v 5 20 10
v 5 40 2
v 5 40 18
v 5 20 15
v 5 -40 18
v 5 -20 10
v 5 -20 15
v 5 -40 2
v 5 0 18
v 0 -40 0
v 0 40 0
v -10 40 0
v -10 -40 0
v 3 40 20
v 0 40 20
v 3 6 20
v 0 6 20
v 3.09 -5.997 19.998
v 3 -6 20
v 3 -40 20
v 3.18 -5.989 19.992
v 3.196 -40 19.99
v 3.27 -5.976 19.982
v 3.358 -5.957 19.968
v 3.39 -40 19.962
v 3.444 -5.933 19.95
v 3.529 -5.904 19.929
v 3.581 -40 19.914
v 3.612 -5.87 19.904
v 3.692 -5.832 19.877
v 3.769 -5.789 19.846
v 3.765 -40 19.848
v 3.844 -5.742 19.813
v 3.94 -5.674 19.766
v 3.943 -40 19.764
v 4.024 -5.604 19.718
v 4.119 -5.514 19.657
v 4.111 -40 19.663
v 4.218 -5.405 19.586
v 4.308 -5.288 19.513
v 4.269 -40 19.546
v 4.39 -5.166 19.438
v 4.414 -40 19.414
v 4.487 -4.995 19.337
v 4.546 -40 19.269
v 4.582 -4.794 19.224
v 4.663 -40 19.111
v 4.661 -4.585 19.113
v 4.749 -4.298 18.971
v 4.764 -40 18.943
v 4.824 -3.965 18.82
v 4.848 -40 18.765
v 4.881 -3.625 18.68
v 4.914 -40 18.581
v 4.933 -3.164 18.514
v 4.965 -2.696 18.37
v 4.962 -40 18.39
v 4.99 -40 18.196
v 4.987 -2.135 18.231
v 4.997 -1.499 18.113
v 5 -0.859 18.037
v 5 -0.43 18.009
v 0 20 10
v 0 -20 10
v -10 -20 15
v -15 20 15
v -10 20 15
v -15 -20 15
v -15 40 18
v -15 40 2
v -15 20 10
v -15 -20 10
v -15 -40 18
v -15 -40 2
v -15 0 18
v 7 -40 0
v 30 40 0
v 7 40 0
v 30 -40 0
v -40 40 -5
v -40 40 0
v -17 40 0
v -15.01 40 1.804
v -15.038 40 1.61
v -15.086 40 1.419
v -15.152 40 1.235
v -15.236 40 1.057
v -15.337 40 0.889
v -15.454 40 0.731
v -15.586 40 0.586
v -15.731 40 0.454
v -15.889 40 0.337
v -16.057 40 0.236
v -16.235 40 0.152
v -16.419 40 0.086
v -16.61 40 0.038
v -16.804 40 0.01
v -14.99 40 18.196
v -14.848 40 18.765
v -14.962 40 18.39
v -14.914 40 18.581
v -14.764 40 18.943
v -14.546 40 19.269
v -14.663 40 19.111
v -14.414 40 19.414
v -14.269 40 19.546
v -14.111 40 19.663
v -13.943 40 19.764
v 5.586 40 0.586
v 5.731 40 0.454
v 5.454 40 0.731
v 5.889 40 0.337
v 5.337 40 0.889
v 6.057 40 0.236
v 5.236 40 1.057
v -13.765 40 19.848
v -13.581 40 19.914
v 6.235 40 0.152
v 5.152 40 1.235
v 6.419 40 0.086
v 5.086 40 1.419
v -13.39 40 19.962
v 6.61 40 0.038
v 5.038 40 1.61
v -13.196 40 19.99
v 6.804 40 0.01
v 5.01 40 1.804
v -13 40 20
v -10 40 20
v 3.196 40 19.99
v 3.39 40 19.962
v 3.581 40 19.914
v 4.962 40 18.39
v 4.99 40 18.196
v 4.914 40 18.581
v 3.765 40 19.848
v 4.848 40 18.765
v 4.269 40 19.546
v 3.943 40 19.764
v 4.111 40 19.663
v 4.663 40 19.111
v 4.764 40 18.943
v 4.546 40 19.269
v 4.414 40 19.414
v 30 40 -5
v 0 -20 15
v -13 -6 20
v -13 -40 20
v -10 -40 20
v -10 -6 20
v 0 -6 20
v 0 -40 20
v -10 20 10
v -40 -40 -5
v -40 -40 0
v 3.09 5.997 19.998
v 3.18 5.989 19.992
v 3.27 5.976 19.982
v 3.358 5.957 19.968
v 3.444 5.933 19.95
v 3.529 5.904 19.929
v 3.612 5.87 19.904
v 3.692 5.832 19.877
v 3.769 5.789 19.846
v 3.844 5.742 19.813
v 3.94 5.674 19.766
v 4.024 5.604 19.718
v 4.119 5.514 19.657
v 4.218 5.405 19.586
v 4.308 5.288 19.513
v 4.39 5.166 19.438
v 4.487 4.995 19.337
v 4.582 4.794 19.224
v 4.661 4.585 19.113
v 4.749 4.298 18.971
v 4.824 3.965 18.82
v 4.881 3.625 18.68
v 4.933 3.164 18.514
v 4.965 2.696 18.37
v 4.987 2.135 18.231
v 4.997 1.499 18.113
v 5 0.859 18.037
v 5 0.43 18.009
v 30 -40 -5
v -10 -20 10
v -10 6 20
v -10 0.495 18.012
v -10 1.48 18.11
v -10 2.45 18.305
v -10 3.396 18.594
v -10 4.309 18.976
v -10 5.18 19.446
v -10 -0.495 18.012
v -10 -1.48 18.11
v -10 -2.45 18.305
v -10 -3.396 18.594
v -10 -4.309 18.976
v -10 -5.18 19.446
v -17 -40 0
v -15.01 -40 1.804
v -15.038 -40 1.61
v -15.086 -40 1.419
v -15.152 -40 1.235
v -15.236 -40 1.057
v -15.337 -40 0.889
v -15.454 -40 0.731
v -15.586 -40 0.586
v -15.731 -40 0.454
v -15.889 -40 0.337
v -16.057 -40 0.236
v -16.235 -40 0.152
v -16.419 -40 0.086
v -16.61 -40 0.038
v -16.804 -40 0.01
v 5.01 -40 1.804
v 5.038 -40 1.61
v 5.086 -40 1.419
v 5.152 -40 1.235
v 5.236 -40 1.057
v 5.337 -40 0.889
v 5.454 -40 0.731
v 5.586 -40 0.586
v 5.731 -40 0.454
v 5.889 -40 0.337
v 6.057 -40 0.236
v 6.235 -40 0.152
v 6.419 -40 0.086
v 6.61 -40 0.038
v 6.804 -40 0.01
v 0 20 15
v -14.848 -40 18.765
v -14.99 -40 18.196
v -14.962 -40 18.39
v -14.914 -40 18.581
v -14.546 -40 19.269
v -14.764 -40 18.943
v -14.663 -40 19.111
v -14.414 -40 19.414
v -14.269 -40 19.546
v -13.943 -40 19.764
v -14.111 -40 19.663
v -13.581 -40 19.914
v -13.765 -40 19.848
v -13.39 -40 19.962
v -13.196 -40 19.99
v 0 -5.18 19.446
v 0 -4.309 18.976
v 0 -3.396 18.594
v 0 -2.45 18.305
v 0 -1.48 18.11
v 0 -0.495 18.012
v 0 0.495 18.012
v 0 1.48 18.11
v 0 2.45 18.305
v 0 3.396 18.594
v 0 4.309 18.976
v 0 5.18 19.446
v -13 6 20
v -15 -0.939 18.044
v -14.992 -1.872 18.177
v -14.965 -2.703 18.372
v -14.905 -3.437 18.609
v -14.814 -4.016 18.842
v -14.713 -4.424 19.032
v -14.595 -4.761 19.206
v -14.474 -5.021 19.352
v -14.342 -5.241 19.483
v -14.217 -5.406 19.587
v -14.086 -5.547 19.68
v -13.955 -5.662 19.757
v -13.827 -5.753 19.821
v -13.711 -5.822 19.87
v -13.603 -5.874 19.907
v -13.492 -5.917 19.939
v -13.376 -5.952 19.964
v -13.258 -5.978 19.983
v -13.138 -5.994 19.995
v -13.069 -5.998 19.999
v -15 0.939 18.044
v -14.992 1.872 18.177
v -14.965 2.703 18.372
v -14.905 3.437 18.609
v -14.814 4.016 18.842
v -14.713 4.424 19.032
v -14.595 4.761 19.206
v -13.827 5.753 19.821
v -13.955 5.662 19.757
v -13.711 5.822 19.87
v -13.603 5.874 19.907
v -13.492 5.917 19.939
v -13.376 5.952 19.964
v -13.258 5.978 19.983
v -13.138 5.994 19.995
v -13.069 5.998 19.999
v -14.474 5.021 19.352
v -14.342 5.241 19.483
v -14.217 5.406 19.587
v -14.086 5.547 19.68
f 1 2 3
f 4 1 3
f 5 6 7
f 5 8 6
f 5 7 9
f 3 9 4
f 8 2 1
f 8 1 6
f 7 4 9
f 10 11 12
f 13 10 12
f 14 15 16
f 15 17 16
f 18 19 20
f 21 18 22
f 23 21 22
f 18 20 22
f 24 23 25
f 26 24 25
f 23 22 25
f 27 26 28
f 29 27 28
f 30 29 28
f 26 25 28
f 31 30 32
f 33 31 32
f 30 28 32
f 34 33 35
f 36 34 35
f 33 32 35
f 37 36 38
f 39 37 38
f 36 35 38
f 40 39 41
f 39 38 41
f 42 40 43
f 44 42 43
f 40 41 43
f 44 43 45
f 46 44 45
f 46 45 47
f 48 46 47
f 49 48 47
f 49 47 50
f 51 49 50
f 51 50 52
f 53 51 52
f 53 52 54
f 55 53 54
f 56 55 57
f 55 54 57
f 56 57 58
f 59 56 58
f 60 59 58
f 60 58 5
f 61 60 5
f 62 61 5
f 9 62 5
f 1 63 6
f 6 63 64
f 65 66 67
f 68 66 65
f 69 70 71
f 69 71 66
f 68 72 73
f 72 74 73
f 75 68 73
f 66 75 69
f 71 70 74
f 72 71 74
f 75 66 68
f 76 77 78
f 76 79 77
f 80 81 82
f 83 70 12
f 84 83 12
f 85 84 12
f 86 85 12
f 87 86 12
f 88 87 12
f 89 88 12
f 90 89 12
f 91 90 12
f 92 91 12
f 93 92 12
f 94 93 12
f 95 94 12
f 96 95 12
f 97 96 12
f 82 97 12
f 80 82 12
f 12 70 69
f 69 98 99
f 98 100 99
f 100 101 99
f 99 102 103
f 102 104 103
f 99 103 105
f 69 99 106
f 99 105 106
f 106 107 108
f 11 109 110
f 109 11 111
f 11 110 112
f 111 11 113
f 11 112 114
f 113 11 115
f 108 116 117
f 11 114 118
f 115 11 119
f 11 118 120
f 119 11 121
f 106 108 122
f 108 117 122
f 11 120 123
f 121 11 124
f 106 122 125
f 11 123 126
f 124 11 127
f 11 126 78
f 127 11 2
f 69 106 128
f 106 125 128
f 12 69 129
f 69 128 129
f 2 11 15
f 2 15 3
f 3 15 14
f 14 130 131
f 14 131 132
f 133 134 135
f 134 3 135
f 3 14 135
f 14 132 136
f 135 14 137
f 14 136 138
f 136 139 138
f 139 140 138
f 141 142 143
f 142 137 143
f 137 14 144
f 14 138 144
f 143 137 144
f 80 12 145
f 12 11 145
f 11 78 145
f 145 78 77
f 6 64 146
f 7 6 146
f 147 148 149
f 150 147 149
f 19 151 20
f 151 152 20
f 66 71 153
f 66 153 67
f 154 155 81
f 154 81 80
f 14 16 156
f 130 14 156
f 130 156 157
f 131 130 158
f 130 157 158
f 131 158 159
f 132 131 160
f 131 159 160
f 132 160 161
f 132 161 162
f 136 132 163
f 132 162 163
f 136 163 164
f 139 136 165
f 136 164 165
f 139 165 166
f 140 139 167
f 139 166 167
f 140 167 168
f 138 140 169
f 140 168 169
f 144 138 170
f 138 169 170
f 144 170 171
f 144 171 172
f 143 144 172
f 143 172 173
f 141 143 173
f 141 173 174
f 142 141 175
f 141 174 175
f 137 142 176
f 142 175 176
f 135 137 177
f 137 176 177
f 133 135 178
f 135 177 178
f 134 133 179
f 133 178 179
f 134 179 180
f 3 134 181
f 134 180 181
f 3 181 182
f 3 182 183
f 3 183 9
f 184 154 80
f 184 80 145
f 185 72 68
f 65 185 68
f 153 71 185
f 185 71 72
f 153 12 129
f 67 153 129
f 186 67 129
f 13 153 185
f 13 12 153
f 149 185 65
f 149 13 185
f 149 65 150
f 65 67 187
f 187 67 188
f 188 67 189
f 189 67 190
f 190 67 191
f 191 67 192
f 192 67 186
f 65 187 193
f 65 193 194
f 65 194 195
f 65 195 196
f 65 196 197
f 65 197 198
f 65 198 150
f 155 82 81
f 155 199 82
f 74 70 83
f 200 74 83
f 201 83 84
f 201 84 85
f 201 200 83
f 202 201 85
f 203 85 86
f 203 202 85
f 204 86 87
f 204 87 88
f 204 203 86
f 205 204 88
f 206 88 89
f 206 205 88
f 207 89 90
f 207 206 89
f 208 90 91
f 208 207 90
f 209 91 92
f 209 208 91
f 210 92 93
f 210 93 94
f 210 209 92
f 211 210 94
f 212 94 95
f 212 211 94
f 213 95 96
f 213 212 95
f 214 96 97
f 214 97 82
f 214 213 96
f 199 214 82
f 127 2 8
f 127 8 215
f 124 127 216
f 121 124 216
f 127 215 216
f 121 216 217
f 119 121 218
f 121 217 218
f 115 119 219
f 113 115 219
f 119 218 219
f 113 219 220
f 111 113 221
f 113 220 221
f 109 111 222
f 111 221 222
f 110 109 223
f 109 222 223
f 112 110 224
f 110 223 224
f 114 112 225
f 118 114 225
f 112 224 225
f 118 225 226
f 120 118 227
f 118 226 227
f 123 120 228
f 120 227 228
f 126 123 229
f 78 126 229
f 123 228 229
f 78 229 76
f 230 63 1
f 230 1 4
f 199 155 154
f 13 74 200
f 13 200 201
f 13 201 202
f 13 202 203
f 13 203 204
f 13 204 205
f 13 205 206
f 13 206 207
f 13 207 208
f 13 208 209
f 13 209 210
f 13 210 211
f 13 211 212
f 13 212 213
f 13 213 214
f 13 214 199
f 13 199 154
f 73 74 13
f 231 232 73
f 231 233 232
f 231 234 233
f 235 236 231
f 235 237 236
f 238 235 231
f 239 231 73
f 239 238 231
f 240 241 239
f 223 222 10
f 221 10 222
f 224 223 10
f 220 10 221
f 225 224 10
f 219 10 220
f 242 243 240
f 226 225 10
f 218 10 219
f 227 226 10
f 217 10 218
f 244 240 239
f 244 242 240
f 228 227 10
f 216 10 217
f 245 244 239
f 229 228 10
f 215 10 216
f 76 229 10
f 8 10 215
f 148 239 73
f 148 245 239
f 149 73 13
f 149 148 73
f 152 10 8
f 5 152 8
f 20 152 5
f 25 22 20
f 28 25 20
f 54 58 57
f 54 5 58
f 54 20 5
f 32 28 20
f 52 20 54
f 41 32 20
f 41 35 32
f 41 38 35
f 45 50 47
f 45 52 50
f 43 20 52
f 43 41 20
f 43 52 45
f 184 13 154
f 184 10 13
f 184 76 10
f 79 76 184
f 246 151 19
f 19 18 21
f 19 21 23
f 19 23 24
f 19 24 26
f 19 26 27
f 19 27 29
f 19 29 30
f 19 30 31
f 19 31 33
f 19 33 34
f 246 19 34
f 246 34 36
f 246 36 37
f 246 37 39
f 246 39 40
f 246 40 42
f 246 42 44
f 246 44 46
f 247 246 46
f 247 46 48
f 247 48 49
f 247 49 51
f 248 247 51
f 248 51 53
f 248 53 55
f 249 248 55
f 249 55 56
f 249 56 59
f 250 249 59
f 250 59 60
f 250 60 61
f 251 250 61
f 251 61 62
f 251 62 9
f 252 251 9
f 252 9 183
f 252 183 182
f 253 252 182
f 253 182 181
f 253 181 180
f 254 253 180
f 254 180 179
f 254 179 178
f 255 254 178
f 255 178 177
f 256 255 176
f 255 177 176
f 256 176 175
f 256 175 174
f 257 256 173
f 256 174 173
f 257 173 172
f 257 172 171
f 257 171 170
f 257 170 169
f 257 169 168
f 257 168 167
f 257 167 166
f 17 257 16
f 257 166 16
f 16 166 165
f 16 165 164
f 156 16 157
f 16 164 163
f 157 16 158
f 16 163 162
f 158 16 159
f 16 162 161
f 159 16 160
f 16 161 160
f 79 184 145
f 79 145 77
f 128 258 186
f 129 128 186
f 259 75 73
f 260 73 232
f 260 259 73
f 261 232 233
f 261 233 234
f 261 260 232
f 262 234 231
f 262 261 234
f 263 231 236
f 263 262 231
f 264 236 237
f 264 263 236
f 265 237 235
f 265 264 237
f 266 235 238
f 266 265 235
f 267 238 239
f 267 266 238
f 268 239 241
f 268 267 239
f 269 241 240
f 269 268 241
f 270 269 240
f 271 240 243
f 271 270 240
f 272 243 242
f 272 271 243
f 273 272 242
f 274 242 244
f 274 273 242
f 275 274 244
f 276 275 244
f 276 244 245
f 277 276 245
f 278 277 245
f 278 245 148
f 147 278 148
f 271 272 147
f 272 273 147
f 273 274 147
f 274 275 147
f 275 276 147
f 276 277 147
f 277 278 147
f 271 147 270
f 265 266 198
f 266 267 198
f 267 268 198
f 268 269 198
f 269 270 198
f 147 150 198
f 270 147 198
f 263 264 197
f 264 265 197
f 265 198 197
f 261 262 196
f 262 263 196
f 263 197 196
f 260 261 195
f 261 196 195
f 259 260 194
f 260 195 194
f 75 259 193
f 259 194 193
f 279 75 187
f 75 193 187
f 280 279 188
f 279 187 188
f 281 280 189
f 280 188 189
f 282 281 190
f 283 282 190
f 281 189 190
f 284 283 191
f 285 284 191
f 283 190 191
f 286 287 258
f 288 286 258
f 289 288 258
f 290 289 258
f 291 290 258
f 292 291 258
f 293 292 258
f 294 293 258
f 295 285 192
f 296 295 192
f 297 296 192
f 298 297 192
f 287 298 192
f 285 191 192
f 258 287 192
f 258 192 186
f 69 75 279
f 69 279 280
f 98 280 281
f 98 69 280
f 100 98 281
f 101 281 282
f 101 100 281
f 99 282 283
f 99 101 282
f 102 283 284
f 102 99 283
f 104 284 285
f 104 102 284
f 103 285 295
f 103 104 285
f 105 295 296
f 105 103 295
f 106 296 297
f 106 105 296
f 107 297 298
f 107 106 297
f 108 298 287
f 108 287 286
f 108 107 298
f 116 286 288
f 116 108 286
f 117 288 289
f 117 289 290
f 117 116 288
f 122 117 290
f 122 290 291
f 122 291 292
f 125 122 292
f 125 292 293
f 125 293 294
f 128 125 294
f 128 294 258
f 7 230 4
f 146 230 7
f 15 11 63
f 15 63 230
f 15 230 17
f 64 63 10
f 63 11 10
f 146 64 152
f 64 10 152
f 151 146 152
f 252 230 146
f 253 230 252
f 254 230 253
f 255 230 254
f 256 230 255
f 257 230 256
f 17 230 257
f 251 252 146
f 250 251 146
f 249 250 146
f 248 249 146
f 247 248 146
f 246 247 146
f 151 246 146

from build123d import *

# Parameters (mm, degrees)
F0_W     = 5
F0_H     = 20
F1_DEPTH = 40
F2_R     = 2
F3_R     = 2
F4_W     = 40
F4_H     = 5
F5_DEPTH = 25
F6_R     = 10
F7_DEPTH = 25


with BuildPart() as f1:
    # F0 (on Front) → F1 (new body, symmetric)
    with BuildSketch(Plane.XZ):
        with Locations((-12.5, 10)):
            Rectangle(F0_W, F0_H)
        Polygon((0, 0), (-10, 0), (-15, 0), (-40, 0), (-40, -5), (0, -5), align=None)
        with Locations((2.5, 10)):
            Rectangle(F0_W, F0_H)
        Polygon((5, 0), (0, 0), (0, -5), (30, -5), (30, 0), align=None)
    extrude(amount=F1_DEPTH, both=True)

    # F2
    f2_edges = [f1.edges().sort_by_distance(p)[0] for p in [
        (5, 0, 0),
        (-15, 0, 0),
    ]]
    fillet(f2_edges, radius=F2_R)

    # F3
    f3_edges = [f1.edges().sort_by_distance(p)[0] for p in [
        (-15, 0, 20),
        (5, 0, 20),
    ]]
    fillet(f3_edges, radius=F3_R)

    # F4 (on face) → F5 (cut)
    with BuildSketch(Plane(origin=(-15, 0, 0), x_dir=(0, -1, 0), z_dir=(-1, 0, 0))):
        with Locations((0, 12.5)):
            Rectangle(F4_W, F4_H)
    extrude(amount=-F5_DEPTH, mode=Mode.SUBTRACT)

    # F6 (on face) → F7 (cut)
    with BuildSketch(Plane.YZ.offset(5)):
        with Locations((0, 28)):
            Circle(F6_R)
    extrude(amount=-F7_DEPTH, mode=Mode.SUBTRACT)


solid = f1.part
